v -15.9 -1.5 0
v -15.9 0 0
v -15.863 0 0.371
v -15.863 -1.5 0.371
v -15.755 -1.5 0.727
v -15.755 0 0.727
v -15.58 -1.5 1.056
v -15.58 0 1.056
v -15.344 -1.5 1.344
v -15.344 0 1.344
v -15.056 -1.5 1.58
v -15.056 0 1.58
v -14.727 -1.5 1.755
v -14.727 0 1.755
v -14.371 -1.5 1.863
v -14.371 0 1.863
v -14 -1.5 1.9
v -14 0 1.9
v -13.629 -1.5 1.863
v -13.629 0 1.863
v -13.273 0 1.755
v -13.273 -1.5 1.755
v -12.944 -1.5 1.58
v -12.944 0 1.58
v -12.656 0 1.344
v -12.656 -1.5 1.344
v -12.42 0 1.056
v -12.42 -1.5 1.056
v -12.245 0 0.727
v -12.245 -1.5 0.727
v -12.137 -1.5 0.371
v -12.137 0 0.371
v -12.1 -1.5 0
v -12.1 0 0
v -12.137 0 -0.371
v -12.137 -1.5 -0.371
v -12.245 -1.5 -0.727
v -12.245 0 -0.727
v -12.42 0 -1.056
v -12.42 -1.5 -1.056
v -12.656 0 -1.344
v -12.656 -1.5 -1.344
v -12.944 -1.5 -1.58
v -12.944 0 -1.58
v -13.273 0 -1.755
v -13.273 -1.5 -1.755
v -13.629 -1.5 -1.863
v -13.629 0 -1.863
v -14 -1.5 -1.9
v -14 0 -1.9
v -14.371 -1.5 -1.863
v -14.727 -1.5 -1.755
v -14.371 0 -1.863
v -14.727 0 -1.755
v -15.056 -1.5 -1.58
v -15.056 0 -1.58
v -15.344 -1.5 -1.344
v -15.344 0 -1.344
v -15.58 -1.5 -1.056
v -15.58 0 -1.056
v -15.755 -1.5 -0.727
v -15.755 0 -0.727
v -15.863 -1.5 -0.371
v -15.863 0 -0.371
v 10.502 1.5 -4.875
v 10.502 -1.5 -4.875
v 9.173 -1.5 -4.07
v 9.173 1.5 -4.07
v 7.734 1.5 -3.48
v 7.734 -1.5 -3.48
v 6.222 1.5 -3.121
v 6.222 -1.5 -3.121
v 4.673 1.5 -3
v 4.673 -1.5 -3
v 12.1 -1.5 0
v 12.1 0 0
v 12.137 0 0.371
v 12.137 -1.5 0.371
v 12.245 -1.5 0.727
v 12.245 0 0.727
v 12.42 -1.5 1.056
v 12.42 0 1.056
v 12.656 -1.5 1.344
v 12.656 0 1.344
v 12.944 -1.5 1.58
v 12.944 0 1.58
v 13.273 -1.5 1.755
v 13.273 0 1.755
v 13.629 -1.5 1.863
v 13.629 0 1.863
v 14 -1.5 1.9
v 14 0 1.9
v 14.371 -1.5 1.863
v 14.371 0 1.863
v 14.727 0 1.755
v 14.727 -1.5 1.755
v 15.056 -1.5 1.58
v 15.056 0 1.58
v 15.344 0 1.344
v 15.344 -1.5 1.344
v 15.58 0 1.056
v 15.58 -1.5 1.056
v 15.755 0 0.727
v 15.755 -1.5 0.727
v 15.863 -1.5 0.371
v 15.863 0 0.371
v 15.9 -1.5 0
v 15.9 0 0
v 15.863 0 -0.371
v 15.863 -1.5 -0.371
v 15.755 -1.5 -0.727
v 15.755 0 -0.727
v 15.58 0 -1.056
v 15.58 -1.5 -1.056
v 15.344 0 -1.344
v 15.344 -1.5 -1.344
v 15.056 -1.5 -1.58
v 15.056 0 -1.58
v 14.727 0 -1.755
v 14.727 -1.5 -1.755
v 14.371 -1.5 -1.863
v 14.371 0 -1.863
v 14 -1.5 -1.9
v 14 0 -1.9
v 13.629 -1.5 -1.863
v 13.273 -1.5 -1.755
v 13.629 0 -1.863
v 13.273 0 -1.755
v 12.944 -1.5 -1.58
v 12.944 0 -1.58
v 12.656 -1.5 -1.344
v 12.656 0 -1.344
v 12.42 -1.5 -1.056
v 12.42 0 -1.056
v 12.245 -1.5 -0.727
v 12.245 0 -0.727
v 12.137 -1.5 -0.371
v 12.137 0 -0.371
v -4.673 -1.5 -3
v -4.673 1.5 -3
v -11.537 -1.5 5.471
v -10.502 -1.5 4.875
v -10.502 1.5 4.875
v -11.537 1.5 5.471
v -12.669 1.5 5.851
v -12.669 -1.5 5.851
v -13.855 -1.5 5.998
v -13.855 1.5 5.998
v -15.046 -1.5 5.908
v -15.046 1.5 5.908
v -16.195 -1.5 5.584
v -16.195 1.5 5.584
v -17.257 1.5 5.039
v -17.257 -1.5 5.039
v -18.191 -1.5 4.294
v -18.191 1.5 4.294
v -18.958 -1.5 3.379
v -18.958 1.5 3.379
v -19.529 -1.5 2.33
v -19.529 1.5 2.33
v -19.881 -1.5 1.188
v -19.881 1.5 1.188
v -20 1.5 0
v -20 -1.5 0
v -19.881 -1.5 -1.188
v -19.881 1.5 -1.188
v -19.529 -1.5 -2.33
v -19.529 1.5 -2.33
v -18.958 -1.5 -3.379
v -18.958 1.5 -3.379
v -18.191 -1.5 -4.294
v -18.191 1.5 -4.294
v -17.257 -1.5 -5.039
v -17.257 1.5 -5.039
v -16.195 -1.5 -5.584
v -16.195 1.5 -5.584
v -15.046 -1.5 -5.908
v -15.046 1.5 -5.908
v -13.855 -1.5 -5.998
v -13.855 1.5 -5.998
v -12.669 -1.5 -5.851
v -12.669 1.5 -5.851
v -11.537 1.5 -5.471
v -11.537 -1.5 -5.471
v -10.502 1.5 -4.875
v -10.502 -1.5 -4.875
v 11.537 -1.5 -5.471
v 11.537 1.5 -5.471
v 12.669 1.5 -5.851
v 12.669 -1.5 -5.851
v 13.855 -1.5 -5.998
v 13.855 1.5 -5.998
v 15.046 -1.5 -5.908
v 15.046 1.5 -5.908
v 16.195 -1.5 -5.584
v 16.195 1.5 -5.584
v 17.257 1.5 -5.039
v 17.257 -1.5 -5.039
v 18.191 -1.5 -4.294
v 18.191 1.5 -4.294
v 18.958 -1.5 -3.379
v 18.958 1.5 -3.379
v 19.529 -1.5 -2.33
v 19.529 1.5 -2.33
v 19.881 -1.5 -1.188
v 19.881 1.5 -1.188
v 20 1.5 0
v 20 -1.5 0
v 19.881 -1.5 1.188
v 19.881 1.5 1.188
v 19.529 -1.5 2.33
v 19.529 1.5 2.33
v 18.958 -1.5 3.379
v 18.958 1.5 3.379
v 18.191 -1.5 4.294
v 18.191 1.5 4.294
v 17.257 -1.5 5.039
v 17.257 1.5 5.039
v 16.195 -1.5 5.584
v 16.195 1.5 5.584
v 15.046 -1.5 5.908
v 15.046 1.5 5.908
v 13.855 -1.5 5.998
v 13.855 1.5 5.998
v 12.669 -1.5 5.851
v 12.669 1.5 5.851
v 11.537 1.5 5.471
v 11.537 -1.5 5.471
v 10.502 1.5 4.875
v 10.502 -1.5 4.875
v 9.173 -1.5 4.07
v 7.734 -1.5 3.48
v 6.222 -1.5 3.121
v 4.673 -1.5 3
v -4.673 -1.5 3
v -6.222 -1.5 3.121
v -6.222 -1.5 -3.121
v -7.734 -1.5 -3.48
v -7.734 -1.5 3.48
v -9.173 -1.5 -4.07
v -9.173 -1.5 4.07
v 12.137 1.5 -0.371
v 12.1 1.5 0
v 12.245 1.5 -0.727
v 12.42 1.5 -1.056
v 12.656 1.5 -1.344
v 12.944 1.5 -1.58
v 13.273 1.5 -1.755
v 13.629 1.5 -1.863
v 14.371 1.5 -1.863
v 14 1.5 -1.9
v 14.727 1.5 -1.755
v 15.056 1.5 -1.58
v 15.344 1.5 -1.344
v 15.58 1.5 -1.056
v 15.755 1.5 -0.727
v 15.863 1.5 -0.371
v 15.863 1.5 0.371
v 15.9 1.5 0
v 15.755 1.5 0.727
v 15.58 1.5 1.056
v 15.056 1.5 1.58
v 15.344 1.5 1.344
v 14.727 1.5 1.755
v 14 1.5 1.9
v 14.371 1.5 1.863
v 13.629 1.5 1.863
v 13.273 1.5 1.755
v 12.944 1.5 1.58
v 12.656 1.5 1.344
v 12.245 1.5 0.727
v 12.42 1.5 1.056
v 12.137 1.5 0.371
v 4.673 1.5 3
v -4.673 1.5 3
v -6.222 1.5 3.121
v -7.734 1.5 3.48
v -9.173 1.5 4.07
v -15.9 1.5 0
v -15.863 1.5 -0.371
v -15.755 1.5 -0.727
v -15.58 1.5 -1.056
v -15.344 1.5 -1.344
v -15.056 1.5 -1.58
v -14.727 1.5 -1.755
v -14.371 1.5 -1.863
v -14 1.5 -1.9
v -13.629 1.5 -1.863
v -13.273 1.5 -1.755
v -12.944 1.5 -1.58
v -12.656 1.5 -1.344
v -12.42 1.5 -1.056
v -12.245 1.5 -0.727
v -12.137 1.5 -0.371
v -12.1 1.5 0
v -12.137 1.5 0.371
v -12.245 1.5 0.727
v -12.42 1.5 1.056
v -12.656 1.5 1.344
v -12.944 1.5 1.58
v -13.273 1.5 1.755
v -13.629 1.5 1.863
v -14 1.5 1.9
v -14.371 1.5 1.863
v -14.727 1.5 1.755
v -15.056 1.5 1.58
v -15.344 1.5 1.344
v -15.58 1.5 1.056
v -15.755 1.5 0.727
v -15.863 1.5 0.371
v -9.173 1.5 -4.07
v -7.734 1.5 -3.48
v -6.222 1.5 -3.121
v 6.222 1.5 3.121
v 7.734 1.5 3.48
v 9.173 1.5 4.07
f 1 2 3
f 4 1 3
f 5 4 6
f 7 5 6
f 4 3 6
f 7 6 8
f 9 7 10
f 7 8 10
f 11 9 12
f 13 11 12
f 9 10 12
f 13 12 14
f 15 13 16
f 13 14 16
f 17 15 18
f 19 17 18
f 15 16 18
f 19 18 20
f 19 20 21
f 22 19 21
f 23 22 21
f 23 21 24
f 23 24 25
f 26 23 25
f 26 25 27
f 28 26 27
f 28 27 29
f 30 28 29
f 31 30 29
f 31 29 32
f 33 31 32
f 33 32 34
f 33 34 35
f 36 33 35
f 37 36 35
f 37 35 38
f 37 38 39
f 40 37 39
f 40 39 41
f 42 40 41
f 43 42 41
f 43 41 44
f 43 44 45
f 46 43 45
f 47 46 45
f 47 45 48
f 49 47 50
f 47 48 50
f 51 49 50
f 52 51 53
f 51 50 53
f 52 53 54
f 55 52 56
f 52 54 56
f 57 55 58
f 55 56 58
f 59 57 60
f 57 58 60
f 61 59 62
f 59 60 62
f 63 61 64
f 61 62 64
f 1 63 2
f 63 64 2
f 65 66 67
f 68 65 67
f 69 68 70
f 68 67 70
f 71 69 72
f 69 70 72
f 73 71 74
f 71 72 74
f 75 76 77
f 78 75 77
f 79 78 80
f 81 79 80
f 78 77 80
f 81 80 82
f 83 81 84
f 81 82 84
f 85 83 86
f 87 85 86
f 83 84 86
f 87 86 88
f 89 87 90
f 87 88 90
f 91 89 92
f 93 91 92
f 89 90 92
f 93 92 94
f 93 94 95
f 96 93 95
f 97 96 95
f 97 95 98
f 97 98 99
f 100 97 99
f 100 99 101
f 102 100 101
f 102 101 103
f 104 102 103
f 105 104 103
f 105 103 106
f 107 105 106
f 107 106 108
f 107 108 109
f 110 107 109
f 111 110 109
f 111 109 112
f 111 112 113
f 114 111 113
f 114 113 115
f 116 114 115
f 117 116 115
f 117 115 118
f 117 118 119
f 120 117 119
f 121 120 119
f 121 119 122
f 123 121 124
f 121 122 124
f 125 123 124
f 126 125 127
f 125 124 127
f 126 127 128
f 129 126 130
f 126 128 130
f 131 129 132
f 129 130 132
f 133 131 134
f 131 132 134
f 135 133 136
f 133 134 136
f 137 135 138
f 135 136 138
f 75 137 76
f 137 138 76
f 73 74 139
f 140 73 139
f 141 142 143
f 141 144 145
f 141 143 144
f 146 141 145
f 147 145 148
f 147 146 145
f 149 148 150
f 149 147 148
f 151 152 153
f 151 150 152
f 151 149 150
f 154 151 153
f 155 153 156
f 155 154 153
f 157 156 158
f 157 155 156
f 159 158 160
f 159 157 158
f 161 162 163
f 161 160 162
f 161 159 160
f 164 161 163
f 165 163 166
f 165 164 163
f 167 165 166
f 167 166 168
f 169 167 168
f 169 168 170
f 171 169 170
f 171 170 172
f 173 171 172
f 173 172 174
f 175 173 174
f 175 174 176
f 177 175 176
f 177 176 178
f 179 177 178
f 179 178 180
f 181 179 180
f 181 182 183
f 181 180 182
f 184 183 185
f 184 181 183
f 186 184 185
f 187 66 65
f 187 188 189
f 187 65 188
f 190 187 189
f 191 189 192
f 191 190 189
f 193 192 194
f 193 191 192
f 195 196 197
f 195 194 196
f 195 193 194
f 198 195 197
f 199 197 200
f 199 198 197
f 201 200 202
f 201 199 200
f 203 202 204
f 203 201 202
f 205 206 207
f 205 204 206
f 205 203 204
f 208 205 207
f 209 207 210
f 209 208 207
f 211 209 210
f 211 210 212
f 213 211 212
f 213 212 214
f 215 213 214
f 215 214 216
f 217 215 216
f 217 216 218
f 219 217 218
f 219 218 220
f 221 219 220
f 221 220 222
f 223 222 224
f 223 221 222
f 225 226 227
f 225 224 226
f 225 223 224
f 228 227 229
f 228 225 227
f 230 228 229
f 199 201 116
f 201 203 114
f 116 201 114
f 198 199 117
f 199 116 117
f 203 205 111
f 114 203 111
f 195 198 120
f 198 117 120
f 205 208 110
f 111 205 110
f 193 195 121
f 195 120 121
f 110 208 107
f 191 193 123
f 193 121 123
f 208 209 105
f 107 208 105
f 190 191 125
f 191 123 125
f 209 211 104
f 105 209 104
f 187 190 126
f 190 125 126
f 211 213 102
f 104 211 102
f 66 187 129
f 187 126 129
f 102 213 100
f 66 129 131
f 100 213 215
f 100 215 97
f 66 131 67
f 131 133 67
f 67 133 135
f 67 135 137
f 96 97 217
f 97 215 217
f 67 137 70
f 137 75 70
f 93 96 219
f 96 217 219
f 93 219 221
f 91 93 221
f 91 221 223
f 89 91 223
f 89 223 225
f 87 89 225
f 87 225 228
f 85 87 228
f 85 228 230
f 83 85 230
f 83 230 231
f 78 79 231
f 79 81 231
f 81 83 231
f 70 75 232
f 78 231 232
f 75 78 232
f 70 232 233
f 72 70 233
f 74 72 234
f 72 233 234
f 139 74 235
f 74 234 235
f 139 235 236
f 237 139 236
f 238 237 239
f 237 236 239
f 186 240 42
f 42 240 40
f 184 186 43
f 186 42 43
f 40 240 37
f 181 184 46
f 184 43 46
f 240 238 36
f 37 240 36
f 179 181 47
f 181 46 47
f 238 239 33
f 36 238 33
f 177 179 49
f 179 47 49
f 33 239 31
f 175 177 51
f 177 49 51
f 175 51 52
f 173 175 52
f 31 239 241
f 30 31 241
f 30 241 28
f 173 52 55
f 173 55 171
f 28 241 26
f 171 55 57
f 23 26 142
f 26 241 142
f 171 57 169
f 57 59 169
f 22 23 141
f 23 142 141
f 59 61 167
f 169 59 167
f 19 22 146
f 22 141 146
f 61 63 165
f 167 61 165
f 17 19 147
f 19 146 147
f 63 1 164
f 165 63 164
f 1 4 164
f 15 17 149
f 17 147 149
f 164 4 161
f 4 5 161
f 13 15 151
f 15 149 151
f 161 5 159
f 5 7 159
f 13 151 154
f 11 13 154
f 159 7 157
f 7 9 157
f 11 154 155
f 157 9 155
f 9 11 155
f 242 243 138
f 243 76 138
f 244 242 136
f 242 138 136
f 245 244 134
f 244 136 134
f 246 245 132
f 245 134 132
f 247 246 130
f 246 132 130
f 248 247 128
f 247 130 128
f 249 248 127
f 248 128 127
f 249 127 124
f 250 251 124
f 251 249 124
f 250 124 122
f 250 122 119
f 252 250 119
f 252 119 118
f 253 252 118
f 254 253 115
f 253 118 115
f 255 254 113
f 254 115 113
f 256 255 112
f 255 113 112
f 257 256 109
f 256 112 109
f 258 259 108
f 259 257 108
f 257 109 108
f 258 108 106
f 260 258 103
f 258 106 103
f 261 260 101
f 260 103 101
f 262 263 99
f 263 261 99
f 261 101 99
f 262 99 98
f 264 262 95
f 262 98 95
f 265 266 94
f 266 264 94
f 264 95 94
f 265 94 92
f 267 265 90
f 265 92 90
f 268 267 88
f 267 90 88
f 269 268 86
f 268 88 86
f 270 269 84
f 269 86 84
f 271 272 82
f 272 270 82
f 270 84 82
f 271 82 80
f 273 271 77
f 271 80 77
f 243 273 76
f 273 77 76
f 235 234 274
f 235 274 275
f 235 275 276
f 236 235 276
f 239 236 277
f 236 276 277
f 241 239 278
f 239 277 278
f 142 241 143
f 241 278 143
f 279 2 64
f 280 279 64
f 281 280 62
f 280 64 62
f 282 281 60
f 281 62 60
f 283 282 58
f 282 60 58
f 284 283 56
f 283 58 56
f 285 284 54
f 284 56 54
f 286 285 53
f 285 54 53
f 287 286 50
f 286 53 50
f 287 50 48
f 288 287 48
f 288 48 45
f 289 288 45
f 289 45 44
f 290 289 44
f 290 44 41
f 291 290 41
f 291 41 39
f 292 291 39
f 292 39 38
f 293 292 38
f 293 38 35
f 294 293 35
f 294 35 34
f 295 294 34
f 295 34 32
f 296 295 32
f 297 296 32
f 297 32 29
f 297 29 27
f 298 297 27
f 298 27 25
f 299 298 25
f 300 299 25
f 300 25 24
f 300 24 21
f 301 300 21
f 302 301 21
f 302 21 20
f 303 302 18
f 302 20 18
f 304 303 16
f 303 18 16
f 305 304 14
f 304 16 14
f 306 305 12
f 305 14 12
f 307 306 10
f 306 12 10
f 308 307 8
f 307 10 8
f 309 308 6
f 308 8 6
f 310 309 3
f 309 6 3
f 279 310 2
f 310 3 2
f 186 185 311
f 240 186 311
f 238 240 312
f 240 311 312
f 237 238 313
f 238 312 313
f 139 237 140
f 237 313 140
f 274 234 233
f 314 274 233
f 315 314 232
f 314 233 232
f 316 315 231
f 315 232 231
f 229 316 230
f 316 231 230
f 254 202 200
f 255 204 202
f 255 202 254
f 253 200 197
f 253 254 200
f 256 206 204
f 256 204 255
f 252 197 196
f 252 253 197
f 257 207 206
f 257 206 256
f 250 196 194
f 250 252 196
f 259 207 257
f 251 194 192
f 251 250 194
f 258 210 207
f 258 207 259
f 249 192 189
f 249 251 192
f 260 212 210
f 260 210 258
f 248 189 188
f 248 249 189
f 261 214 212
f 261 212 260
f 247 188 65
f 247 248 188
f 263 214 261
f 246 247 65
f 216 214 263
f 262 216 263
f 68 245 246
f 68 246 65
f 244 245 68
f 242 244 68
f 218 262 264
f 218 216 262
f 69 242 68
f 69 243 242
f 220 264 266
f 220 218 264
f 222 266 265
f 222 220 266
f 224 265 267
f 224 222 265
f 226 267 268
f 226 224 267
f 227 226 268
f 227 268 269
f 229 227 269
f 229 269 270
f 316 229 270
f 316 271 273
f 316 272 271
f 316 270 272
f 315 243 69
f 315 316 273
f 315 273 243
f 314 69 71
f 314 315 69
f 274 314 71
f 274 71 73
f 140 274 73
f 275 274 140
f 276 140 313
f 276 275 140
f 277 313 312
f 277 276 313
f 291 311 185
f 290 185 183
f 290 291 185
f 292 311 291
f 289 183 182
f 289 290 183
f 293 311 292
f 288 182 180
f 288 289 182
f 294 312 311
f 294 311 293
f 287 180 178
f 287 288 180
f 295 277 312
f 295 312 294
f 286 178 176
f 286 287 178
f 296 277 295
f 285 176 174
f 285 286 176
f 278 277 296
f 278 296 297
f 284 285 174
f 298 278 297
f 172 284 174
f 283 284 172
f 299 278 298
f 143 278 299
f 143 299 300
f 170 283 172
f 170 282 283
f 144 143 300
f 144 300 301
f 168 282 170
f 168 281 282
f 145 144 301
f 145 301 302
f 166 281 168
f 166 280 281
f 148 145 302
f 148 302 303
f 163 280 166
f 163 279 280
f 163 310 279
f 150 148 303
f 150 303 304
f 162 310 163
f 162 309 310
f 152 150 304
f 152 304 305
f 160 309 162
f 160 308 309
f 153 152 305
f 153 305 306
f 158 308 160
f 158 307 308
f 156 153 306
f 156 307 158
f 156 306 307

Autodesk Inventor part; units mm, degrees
ref_plane "YZ Plane" through (0, 0, 0) normal (1, 0, 0) x (0, 1, 0)
ref_plane "XZ Plane" through (0, 0, 0) normal (0, 1, 0) x (-1, 0, 0)
ref_plane "XY Plane" through (0, 0, 0) normal (0, 0, 1) x (1, 0, 0)
sketch "Эскиз1" plane through (0, 0, 0) normal (0, 1, 0) x (-1, 0, 0)
  arc A0 (8.8038, -3) -> (8.8038, 3) centre (14, 0) ccw
  line L0 (30.0057, 0) -> (28.0258, 0)
  circle A1 centre (14, 0) radius 1.9
  arc A2 (-8.8038, 3) -> (-8.8038, -3) centre (-14, 0) ccw
  line L1 (-8.8038, -3) -> (8.8038, -3)
  line L2 (-8.8038, 3) -> (8.8038, 3)
  circle A3 centre (-14, 0) radius 1.9
  line L3 (32.9518, 0) -> (37.6343, 0) construction
  line L4 (14.11, -3) -> (14.11, 3)
  line L5 (0, -3) -> (0, 3)
  point P0 (0, 0)
  point P1 (25.2378, -3)
  point P2 (25.2378, 3)
  point P3 (0, 0)
  dimension "d2" = 6
  dimension "d3" = 14
  dimension "d4" = 3.8
  dimension "d9" = 6
extrude "Выдавливание1" add sketch "Эскиз1" along normal mid plane 3
fillet "Сопряжение1" radius 10 4 edges at (-8.8038, 0, 3) (-8.8038, 0, -3) (8.8038, 0, -3) (8.8038, 0, 3)
properties part number "Рычаг"
